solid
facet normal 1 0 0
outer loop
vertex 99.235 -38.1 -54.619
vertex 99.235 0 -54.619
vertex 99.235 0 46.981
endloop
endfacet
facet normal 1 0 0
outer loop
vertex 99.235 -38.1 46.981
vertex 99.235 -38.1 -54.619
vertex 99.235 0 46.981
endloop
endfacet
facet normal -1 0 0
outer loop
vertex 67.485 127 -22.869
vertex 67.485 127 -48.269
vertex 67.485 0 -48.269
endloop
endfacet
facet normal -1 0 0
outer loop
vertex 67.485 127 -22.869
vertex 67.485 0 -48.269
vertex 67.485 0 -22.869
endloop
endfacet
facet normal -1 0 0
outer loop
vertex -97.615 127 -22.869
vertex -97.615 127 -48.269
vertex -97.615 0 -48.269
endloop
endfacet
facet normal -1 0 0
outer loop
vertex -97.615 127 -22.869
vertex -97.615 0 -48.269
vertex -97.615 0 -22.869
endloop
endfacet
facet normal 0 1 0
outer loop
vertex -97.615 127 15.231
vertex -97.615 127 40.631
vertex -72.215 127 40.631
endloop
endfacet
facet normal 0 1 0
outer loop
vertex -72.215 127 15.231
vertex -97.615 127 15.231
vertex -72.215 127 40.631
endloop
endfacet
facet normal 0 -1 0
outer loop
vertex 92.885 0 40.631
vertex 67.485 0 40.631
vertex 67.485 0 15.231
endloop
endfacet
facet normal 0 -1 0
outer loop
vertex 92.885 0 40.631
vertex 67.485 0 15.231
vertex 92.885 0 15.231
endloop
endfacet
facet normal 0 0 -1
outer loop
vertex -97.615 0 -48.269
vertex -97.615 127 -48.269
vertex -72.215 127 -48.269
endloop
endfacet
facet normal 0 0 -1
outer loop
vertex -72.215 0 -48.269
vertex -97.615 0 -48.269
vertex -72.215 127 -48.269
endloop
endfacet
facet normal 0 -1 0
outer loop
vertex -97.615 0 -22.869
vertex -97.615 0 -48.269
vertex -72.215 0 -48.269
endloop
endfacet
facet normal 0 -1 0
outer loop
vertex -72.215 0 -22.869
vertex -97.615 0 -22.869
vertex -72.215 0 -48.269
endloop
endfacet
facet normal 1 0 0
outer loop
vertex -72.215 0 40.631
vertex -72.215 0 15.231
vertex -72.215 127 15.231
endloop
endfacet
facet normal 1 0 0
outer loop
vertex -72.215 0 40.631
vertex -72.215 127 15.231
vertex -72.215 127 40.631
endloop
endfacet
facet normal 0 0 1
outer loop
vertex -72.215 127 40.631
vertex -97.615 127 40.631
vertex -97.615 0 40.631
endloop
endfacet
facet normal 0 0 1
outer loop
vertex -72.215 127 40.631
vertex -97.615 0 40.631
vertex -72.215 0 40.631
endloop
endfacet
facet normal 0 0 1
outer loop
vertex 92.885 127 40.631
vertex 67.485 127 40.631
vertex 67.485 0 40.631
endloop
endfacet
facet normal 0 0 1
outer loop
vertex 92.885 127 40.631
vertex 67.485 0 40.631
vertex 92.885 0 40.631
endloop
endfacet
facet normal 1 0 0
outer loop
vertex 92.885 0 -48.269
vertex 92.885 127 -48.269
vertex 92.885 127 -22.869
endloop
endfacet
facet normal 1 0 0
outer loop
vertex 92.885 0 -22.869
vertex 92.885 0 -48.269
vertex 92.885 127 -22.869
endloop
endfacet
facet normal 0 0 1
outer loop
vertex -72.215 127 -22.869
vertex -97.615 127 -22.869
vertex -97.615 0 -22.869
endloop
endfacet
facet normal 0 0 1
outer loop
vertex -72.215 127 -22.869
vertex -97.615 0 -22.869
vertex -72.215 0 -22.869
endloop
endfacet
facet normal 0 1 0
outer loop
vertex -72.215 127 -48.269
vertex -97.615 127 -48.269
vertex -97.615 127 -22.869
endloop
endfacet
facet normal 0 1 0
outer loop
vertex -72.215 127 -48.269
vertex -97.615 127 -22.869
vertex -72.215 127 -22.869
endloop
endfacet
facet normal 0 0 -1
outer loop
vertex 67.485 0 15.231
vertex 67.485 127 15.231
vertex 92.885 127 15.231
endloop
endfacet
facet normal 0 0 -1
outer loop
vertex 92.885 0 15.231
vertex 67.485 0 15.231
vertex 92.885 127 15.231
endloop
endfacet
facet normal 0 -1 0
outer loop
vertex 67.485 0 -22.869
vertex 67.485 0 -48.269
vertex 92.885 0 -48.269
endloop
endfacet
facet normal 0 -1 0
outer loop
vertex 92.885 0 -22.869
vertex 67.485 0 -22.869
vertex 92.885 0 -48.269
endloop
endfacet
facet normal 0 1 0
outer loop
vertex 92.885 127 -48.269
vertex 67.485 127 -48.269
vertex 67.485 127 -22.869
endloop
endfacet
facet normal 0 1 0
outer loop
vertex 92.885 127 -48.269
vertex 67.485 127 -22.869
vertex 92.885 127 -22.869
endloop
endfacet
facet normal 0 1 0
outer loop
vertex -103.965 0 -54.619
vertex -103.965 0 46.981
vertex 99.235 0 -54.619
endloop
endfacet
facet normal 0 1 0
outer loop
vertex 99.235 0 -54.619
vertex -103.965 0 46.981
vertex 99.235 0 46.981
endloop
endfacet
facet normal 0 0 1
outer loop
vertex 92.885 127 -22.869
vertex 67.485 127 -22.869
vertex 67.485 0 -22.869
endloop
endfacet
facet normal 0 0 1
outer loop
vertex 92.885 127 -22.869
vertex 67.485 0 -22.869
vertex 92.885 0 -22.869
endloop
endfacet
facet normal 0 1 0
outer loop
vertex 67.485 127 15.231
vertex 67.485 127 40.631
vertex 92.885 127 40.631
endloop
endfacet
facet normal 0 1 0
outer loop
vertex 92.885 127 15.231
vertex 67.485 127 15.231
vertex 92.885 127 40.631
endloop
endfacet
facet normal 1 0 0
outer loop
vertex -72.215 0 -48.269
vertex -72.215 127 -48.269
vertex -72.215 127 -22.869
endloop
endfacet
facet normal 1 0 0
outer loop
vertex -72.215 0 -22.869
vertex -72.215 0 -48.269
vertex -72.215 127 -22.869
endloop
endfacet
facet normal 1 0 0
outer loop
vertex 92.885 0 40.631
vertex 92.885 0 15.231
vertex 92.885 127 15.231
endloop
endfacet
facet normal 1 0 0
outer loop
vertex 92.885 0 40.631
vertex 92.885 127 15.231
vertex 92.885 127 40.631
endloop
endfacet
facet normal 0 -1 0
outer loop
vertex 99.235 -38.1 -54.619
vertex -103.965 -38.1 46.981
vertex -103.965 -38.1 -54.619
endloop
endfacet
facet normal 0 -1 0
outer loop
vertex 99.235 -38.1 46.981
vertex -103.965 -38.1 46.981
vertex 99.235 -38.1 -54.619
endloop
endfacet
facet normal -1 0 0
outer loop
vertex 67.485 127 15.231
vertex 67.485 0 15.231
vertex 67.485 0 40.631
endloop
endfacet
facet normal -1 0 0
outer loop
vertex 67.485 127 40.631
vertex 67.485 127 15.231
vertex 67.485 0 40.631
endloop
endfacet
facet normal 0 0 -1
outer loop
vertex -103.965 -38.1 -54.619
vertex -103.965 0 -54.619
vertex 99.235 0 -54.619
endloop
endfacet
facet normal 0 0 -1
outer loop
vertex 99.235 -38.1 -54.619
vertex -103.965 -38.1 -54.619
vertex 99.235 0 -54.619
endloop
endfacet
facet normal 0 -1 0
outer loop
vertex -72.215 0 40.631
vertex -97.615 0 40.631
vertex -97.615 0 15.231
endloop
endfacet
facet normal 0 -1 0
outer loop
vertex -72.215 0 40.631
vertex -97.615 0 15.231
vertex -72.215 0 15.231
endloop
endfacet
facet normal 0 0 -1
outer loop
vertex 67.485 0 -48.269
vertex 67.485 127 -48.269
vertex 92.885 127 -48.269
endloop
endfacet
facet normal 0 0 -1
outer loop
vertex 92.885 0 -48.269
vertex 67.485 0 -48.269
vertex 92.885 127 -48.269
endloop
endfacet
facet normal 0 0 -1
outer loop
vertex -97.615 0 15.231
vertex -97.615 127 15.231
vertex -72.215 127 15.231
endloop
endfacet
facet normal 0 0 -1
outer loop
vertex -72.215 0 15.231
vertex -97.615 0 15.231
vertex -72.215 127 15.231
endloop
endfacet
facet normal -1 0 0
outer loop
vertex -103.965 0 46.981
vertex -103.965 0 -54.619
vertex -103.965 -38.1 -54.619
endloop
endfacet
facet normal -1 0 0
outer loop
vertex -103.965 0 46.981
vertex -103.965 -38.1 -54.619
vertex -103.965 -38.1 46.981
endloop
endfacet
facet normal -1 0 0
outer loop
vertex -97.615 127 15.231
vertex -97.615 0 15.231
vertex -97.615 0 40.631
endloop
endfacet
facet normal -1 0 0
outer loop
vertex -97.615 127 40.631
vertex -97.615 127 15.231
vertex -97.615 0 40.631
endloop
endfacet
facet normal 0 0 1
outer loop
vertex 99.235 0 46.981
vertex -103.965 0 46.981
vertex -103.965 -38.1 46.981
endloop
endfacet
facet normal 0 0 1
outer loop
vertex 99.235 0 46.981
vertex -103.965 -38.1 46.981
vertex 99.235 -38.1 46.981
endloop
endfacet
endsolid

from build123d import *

# Parameters (mm, degrees)
F0_W     = 203.2
F0_H     = 101.6
F0_W_2   = 25.4
F0_H_2   = 25.4
F1_DEPTH = 38.1
F2_DEPTH = 127


with BuildPart() as f1:
    # F0 (on Front) → F1 (new body)
    with BuildSketch(Plane.XZ):
        with Locations((-2.364829, -3.819169)):
            Rectangle(F0_W, F0_H)
        with Locations((-84.914829, -35.569169)):
            Rectangle(F0_W_2, F0_H_2, mode=Mode.SUBTRACT)
        with Locations((80.185171, -35.569169)):
            Rectangle(F0_W_2, F0_H_2, mode=Mode.SUBTRACT)
        with Locations((-84.914829, 27.930831)):
            Rectangle(F0_W_2, F0_H_2, mode=Mode.SUBTRACT)
        with Locations((80.185171, 27.930831)):
            Rectangle(F0_W_2, F0_H_2, mode=Mode.SUBTRACT)
        with Locations((-84.914829, -35.569169)):
            Rectangle(F0_W_2, F0_H_2)
        with Locations((-84.914829, 27.930831)):
            Rectangle(F0_W_2, F0_H_2)
        with Locations((80.185171, 27.930831)):
            Rectangle(F0_W_2, F0_H_2)
        with Locations((80.185171, -35.569169)):
            Rectangle(F0_W_2, F0_H_2)
    extrude(amount=F1_DEPTH)


with BuildPart() as f2:
    # F0 (on Front) → F2 (new body)
    with BuildSketch(Plane.XZ):
        with Locations((-84.914829, -35.569169)):
            Rectangle(F0_W_2, F0_H_2)
        with Locations((-84.914829, 27.930831)):
            Rectangle(F0_W_2, F0_H_2)
        with Locations((80.185171, 27.930831)):
            Rectangle(F0_W_2, F0_H_2)
        with Locations((80.185171, -35.569169)):
            Rectangle(F0_W_2, F0_H_2)
    extrude(amount=-F2_DEPTH)


solid = Compound([f1.part, f2.part])
